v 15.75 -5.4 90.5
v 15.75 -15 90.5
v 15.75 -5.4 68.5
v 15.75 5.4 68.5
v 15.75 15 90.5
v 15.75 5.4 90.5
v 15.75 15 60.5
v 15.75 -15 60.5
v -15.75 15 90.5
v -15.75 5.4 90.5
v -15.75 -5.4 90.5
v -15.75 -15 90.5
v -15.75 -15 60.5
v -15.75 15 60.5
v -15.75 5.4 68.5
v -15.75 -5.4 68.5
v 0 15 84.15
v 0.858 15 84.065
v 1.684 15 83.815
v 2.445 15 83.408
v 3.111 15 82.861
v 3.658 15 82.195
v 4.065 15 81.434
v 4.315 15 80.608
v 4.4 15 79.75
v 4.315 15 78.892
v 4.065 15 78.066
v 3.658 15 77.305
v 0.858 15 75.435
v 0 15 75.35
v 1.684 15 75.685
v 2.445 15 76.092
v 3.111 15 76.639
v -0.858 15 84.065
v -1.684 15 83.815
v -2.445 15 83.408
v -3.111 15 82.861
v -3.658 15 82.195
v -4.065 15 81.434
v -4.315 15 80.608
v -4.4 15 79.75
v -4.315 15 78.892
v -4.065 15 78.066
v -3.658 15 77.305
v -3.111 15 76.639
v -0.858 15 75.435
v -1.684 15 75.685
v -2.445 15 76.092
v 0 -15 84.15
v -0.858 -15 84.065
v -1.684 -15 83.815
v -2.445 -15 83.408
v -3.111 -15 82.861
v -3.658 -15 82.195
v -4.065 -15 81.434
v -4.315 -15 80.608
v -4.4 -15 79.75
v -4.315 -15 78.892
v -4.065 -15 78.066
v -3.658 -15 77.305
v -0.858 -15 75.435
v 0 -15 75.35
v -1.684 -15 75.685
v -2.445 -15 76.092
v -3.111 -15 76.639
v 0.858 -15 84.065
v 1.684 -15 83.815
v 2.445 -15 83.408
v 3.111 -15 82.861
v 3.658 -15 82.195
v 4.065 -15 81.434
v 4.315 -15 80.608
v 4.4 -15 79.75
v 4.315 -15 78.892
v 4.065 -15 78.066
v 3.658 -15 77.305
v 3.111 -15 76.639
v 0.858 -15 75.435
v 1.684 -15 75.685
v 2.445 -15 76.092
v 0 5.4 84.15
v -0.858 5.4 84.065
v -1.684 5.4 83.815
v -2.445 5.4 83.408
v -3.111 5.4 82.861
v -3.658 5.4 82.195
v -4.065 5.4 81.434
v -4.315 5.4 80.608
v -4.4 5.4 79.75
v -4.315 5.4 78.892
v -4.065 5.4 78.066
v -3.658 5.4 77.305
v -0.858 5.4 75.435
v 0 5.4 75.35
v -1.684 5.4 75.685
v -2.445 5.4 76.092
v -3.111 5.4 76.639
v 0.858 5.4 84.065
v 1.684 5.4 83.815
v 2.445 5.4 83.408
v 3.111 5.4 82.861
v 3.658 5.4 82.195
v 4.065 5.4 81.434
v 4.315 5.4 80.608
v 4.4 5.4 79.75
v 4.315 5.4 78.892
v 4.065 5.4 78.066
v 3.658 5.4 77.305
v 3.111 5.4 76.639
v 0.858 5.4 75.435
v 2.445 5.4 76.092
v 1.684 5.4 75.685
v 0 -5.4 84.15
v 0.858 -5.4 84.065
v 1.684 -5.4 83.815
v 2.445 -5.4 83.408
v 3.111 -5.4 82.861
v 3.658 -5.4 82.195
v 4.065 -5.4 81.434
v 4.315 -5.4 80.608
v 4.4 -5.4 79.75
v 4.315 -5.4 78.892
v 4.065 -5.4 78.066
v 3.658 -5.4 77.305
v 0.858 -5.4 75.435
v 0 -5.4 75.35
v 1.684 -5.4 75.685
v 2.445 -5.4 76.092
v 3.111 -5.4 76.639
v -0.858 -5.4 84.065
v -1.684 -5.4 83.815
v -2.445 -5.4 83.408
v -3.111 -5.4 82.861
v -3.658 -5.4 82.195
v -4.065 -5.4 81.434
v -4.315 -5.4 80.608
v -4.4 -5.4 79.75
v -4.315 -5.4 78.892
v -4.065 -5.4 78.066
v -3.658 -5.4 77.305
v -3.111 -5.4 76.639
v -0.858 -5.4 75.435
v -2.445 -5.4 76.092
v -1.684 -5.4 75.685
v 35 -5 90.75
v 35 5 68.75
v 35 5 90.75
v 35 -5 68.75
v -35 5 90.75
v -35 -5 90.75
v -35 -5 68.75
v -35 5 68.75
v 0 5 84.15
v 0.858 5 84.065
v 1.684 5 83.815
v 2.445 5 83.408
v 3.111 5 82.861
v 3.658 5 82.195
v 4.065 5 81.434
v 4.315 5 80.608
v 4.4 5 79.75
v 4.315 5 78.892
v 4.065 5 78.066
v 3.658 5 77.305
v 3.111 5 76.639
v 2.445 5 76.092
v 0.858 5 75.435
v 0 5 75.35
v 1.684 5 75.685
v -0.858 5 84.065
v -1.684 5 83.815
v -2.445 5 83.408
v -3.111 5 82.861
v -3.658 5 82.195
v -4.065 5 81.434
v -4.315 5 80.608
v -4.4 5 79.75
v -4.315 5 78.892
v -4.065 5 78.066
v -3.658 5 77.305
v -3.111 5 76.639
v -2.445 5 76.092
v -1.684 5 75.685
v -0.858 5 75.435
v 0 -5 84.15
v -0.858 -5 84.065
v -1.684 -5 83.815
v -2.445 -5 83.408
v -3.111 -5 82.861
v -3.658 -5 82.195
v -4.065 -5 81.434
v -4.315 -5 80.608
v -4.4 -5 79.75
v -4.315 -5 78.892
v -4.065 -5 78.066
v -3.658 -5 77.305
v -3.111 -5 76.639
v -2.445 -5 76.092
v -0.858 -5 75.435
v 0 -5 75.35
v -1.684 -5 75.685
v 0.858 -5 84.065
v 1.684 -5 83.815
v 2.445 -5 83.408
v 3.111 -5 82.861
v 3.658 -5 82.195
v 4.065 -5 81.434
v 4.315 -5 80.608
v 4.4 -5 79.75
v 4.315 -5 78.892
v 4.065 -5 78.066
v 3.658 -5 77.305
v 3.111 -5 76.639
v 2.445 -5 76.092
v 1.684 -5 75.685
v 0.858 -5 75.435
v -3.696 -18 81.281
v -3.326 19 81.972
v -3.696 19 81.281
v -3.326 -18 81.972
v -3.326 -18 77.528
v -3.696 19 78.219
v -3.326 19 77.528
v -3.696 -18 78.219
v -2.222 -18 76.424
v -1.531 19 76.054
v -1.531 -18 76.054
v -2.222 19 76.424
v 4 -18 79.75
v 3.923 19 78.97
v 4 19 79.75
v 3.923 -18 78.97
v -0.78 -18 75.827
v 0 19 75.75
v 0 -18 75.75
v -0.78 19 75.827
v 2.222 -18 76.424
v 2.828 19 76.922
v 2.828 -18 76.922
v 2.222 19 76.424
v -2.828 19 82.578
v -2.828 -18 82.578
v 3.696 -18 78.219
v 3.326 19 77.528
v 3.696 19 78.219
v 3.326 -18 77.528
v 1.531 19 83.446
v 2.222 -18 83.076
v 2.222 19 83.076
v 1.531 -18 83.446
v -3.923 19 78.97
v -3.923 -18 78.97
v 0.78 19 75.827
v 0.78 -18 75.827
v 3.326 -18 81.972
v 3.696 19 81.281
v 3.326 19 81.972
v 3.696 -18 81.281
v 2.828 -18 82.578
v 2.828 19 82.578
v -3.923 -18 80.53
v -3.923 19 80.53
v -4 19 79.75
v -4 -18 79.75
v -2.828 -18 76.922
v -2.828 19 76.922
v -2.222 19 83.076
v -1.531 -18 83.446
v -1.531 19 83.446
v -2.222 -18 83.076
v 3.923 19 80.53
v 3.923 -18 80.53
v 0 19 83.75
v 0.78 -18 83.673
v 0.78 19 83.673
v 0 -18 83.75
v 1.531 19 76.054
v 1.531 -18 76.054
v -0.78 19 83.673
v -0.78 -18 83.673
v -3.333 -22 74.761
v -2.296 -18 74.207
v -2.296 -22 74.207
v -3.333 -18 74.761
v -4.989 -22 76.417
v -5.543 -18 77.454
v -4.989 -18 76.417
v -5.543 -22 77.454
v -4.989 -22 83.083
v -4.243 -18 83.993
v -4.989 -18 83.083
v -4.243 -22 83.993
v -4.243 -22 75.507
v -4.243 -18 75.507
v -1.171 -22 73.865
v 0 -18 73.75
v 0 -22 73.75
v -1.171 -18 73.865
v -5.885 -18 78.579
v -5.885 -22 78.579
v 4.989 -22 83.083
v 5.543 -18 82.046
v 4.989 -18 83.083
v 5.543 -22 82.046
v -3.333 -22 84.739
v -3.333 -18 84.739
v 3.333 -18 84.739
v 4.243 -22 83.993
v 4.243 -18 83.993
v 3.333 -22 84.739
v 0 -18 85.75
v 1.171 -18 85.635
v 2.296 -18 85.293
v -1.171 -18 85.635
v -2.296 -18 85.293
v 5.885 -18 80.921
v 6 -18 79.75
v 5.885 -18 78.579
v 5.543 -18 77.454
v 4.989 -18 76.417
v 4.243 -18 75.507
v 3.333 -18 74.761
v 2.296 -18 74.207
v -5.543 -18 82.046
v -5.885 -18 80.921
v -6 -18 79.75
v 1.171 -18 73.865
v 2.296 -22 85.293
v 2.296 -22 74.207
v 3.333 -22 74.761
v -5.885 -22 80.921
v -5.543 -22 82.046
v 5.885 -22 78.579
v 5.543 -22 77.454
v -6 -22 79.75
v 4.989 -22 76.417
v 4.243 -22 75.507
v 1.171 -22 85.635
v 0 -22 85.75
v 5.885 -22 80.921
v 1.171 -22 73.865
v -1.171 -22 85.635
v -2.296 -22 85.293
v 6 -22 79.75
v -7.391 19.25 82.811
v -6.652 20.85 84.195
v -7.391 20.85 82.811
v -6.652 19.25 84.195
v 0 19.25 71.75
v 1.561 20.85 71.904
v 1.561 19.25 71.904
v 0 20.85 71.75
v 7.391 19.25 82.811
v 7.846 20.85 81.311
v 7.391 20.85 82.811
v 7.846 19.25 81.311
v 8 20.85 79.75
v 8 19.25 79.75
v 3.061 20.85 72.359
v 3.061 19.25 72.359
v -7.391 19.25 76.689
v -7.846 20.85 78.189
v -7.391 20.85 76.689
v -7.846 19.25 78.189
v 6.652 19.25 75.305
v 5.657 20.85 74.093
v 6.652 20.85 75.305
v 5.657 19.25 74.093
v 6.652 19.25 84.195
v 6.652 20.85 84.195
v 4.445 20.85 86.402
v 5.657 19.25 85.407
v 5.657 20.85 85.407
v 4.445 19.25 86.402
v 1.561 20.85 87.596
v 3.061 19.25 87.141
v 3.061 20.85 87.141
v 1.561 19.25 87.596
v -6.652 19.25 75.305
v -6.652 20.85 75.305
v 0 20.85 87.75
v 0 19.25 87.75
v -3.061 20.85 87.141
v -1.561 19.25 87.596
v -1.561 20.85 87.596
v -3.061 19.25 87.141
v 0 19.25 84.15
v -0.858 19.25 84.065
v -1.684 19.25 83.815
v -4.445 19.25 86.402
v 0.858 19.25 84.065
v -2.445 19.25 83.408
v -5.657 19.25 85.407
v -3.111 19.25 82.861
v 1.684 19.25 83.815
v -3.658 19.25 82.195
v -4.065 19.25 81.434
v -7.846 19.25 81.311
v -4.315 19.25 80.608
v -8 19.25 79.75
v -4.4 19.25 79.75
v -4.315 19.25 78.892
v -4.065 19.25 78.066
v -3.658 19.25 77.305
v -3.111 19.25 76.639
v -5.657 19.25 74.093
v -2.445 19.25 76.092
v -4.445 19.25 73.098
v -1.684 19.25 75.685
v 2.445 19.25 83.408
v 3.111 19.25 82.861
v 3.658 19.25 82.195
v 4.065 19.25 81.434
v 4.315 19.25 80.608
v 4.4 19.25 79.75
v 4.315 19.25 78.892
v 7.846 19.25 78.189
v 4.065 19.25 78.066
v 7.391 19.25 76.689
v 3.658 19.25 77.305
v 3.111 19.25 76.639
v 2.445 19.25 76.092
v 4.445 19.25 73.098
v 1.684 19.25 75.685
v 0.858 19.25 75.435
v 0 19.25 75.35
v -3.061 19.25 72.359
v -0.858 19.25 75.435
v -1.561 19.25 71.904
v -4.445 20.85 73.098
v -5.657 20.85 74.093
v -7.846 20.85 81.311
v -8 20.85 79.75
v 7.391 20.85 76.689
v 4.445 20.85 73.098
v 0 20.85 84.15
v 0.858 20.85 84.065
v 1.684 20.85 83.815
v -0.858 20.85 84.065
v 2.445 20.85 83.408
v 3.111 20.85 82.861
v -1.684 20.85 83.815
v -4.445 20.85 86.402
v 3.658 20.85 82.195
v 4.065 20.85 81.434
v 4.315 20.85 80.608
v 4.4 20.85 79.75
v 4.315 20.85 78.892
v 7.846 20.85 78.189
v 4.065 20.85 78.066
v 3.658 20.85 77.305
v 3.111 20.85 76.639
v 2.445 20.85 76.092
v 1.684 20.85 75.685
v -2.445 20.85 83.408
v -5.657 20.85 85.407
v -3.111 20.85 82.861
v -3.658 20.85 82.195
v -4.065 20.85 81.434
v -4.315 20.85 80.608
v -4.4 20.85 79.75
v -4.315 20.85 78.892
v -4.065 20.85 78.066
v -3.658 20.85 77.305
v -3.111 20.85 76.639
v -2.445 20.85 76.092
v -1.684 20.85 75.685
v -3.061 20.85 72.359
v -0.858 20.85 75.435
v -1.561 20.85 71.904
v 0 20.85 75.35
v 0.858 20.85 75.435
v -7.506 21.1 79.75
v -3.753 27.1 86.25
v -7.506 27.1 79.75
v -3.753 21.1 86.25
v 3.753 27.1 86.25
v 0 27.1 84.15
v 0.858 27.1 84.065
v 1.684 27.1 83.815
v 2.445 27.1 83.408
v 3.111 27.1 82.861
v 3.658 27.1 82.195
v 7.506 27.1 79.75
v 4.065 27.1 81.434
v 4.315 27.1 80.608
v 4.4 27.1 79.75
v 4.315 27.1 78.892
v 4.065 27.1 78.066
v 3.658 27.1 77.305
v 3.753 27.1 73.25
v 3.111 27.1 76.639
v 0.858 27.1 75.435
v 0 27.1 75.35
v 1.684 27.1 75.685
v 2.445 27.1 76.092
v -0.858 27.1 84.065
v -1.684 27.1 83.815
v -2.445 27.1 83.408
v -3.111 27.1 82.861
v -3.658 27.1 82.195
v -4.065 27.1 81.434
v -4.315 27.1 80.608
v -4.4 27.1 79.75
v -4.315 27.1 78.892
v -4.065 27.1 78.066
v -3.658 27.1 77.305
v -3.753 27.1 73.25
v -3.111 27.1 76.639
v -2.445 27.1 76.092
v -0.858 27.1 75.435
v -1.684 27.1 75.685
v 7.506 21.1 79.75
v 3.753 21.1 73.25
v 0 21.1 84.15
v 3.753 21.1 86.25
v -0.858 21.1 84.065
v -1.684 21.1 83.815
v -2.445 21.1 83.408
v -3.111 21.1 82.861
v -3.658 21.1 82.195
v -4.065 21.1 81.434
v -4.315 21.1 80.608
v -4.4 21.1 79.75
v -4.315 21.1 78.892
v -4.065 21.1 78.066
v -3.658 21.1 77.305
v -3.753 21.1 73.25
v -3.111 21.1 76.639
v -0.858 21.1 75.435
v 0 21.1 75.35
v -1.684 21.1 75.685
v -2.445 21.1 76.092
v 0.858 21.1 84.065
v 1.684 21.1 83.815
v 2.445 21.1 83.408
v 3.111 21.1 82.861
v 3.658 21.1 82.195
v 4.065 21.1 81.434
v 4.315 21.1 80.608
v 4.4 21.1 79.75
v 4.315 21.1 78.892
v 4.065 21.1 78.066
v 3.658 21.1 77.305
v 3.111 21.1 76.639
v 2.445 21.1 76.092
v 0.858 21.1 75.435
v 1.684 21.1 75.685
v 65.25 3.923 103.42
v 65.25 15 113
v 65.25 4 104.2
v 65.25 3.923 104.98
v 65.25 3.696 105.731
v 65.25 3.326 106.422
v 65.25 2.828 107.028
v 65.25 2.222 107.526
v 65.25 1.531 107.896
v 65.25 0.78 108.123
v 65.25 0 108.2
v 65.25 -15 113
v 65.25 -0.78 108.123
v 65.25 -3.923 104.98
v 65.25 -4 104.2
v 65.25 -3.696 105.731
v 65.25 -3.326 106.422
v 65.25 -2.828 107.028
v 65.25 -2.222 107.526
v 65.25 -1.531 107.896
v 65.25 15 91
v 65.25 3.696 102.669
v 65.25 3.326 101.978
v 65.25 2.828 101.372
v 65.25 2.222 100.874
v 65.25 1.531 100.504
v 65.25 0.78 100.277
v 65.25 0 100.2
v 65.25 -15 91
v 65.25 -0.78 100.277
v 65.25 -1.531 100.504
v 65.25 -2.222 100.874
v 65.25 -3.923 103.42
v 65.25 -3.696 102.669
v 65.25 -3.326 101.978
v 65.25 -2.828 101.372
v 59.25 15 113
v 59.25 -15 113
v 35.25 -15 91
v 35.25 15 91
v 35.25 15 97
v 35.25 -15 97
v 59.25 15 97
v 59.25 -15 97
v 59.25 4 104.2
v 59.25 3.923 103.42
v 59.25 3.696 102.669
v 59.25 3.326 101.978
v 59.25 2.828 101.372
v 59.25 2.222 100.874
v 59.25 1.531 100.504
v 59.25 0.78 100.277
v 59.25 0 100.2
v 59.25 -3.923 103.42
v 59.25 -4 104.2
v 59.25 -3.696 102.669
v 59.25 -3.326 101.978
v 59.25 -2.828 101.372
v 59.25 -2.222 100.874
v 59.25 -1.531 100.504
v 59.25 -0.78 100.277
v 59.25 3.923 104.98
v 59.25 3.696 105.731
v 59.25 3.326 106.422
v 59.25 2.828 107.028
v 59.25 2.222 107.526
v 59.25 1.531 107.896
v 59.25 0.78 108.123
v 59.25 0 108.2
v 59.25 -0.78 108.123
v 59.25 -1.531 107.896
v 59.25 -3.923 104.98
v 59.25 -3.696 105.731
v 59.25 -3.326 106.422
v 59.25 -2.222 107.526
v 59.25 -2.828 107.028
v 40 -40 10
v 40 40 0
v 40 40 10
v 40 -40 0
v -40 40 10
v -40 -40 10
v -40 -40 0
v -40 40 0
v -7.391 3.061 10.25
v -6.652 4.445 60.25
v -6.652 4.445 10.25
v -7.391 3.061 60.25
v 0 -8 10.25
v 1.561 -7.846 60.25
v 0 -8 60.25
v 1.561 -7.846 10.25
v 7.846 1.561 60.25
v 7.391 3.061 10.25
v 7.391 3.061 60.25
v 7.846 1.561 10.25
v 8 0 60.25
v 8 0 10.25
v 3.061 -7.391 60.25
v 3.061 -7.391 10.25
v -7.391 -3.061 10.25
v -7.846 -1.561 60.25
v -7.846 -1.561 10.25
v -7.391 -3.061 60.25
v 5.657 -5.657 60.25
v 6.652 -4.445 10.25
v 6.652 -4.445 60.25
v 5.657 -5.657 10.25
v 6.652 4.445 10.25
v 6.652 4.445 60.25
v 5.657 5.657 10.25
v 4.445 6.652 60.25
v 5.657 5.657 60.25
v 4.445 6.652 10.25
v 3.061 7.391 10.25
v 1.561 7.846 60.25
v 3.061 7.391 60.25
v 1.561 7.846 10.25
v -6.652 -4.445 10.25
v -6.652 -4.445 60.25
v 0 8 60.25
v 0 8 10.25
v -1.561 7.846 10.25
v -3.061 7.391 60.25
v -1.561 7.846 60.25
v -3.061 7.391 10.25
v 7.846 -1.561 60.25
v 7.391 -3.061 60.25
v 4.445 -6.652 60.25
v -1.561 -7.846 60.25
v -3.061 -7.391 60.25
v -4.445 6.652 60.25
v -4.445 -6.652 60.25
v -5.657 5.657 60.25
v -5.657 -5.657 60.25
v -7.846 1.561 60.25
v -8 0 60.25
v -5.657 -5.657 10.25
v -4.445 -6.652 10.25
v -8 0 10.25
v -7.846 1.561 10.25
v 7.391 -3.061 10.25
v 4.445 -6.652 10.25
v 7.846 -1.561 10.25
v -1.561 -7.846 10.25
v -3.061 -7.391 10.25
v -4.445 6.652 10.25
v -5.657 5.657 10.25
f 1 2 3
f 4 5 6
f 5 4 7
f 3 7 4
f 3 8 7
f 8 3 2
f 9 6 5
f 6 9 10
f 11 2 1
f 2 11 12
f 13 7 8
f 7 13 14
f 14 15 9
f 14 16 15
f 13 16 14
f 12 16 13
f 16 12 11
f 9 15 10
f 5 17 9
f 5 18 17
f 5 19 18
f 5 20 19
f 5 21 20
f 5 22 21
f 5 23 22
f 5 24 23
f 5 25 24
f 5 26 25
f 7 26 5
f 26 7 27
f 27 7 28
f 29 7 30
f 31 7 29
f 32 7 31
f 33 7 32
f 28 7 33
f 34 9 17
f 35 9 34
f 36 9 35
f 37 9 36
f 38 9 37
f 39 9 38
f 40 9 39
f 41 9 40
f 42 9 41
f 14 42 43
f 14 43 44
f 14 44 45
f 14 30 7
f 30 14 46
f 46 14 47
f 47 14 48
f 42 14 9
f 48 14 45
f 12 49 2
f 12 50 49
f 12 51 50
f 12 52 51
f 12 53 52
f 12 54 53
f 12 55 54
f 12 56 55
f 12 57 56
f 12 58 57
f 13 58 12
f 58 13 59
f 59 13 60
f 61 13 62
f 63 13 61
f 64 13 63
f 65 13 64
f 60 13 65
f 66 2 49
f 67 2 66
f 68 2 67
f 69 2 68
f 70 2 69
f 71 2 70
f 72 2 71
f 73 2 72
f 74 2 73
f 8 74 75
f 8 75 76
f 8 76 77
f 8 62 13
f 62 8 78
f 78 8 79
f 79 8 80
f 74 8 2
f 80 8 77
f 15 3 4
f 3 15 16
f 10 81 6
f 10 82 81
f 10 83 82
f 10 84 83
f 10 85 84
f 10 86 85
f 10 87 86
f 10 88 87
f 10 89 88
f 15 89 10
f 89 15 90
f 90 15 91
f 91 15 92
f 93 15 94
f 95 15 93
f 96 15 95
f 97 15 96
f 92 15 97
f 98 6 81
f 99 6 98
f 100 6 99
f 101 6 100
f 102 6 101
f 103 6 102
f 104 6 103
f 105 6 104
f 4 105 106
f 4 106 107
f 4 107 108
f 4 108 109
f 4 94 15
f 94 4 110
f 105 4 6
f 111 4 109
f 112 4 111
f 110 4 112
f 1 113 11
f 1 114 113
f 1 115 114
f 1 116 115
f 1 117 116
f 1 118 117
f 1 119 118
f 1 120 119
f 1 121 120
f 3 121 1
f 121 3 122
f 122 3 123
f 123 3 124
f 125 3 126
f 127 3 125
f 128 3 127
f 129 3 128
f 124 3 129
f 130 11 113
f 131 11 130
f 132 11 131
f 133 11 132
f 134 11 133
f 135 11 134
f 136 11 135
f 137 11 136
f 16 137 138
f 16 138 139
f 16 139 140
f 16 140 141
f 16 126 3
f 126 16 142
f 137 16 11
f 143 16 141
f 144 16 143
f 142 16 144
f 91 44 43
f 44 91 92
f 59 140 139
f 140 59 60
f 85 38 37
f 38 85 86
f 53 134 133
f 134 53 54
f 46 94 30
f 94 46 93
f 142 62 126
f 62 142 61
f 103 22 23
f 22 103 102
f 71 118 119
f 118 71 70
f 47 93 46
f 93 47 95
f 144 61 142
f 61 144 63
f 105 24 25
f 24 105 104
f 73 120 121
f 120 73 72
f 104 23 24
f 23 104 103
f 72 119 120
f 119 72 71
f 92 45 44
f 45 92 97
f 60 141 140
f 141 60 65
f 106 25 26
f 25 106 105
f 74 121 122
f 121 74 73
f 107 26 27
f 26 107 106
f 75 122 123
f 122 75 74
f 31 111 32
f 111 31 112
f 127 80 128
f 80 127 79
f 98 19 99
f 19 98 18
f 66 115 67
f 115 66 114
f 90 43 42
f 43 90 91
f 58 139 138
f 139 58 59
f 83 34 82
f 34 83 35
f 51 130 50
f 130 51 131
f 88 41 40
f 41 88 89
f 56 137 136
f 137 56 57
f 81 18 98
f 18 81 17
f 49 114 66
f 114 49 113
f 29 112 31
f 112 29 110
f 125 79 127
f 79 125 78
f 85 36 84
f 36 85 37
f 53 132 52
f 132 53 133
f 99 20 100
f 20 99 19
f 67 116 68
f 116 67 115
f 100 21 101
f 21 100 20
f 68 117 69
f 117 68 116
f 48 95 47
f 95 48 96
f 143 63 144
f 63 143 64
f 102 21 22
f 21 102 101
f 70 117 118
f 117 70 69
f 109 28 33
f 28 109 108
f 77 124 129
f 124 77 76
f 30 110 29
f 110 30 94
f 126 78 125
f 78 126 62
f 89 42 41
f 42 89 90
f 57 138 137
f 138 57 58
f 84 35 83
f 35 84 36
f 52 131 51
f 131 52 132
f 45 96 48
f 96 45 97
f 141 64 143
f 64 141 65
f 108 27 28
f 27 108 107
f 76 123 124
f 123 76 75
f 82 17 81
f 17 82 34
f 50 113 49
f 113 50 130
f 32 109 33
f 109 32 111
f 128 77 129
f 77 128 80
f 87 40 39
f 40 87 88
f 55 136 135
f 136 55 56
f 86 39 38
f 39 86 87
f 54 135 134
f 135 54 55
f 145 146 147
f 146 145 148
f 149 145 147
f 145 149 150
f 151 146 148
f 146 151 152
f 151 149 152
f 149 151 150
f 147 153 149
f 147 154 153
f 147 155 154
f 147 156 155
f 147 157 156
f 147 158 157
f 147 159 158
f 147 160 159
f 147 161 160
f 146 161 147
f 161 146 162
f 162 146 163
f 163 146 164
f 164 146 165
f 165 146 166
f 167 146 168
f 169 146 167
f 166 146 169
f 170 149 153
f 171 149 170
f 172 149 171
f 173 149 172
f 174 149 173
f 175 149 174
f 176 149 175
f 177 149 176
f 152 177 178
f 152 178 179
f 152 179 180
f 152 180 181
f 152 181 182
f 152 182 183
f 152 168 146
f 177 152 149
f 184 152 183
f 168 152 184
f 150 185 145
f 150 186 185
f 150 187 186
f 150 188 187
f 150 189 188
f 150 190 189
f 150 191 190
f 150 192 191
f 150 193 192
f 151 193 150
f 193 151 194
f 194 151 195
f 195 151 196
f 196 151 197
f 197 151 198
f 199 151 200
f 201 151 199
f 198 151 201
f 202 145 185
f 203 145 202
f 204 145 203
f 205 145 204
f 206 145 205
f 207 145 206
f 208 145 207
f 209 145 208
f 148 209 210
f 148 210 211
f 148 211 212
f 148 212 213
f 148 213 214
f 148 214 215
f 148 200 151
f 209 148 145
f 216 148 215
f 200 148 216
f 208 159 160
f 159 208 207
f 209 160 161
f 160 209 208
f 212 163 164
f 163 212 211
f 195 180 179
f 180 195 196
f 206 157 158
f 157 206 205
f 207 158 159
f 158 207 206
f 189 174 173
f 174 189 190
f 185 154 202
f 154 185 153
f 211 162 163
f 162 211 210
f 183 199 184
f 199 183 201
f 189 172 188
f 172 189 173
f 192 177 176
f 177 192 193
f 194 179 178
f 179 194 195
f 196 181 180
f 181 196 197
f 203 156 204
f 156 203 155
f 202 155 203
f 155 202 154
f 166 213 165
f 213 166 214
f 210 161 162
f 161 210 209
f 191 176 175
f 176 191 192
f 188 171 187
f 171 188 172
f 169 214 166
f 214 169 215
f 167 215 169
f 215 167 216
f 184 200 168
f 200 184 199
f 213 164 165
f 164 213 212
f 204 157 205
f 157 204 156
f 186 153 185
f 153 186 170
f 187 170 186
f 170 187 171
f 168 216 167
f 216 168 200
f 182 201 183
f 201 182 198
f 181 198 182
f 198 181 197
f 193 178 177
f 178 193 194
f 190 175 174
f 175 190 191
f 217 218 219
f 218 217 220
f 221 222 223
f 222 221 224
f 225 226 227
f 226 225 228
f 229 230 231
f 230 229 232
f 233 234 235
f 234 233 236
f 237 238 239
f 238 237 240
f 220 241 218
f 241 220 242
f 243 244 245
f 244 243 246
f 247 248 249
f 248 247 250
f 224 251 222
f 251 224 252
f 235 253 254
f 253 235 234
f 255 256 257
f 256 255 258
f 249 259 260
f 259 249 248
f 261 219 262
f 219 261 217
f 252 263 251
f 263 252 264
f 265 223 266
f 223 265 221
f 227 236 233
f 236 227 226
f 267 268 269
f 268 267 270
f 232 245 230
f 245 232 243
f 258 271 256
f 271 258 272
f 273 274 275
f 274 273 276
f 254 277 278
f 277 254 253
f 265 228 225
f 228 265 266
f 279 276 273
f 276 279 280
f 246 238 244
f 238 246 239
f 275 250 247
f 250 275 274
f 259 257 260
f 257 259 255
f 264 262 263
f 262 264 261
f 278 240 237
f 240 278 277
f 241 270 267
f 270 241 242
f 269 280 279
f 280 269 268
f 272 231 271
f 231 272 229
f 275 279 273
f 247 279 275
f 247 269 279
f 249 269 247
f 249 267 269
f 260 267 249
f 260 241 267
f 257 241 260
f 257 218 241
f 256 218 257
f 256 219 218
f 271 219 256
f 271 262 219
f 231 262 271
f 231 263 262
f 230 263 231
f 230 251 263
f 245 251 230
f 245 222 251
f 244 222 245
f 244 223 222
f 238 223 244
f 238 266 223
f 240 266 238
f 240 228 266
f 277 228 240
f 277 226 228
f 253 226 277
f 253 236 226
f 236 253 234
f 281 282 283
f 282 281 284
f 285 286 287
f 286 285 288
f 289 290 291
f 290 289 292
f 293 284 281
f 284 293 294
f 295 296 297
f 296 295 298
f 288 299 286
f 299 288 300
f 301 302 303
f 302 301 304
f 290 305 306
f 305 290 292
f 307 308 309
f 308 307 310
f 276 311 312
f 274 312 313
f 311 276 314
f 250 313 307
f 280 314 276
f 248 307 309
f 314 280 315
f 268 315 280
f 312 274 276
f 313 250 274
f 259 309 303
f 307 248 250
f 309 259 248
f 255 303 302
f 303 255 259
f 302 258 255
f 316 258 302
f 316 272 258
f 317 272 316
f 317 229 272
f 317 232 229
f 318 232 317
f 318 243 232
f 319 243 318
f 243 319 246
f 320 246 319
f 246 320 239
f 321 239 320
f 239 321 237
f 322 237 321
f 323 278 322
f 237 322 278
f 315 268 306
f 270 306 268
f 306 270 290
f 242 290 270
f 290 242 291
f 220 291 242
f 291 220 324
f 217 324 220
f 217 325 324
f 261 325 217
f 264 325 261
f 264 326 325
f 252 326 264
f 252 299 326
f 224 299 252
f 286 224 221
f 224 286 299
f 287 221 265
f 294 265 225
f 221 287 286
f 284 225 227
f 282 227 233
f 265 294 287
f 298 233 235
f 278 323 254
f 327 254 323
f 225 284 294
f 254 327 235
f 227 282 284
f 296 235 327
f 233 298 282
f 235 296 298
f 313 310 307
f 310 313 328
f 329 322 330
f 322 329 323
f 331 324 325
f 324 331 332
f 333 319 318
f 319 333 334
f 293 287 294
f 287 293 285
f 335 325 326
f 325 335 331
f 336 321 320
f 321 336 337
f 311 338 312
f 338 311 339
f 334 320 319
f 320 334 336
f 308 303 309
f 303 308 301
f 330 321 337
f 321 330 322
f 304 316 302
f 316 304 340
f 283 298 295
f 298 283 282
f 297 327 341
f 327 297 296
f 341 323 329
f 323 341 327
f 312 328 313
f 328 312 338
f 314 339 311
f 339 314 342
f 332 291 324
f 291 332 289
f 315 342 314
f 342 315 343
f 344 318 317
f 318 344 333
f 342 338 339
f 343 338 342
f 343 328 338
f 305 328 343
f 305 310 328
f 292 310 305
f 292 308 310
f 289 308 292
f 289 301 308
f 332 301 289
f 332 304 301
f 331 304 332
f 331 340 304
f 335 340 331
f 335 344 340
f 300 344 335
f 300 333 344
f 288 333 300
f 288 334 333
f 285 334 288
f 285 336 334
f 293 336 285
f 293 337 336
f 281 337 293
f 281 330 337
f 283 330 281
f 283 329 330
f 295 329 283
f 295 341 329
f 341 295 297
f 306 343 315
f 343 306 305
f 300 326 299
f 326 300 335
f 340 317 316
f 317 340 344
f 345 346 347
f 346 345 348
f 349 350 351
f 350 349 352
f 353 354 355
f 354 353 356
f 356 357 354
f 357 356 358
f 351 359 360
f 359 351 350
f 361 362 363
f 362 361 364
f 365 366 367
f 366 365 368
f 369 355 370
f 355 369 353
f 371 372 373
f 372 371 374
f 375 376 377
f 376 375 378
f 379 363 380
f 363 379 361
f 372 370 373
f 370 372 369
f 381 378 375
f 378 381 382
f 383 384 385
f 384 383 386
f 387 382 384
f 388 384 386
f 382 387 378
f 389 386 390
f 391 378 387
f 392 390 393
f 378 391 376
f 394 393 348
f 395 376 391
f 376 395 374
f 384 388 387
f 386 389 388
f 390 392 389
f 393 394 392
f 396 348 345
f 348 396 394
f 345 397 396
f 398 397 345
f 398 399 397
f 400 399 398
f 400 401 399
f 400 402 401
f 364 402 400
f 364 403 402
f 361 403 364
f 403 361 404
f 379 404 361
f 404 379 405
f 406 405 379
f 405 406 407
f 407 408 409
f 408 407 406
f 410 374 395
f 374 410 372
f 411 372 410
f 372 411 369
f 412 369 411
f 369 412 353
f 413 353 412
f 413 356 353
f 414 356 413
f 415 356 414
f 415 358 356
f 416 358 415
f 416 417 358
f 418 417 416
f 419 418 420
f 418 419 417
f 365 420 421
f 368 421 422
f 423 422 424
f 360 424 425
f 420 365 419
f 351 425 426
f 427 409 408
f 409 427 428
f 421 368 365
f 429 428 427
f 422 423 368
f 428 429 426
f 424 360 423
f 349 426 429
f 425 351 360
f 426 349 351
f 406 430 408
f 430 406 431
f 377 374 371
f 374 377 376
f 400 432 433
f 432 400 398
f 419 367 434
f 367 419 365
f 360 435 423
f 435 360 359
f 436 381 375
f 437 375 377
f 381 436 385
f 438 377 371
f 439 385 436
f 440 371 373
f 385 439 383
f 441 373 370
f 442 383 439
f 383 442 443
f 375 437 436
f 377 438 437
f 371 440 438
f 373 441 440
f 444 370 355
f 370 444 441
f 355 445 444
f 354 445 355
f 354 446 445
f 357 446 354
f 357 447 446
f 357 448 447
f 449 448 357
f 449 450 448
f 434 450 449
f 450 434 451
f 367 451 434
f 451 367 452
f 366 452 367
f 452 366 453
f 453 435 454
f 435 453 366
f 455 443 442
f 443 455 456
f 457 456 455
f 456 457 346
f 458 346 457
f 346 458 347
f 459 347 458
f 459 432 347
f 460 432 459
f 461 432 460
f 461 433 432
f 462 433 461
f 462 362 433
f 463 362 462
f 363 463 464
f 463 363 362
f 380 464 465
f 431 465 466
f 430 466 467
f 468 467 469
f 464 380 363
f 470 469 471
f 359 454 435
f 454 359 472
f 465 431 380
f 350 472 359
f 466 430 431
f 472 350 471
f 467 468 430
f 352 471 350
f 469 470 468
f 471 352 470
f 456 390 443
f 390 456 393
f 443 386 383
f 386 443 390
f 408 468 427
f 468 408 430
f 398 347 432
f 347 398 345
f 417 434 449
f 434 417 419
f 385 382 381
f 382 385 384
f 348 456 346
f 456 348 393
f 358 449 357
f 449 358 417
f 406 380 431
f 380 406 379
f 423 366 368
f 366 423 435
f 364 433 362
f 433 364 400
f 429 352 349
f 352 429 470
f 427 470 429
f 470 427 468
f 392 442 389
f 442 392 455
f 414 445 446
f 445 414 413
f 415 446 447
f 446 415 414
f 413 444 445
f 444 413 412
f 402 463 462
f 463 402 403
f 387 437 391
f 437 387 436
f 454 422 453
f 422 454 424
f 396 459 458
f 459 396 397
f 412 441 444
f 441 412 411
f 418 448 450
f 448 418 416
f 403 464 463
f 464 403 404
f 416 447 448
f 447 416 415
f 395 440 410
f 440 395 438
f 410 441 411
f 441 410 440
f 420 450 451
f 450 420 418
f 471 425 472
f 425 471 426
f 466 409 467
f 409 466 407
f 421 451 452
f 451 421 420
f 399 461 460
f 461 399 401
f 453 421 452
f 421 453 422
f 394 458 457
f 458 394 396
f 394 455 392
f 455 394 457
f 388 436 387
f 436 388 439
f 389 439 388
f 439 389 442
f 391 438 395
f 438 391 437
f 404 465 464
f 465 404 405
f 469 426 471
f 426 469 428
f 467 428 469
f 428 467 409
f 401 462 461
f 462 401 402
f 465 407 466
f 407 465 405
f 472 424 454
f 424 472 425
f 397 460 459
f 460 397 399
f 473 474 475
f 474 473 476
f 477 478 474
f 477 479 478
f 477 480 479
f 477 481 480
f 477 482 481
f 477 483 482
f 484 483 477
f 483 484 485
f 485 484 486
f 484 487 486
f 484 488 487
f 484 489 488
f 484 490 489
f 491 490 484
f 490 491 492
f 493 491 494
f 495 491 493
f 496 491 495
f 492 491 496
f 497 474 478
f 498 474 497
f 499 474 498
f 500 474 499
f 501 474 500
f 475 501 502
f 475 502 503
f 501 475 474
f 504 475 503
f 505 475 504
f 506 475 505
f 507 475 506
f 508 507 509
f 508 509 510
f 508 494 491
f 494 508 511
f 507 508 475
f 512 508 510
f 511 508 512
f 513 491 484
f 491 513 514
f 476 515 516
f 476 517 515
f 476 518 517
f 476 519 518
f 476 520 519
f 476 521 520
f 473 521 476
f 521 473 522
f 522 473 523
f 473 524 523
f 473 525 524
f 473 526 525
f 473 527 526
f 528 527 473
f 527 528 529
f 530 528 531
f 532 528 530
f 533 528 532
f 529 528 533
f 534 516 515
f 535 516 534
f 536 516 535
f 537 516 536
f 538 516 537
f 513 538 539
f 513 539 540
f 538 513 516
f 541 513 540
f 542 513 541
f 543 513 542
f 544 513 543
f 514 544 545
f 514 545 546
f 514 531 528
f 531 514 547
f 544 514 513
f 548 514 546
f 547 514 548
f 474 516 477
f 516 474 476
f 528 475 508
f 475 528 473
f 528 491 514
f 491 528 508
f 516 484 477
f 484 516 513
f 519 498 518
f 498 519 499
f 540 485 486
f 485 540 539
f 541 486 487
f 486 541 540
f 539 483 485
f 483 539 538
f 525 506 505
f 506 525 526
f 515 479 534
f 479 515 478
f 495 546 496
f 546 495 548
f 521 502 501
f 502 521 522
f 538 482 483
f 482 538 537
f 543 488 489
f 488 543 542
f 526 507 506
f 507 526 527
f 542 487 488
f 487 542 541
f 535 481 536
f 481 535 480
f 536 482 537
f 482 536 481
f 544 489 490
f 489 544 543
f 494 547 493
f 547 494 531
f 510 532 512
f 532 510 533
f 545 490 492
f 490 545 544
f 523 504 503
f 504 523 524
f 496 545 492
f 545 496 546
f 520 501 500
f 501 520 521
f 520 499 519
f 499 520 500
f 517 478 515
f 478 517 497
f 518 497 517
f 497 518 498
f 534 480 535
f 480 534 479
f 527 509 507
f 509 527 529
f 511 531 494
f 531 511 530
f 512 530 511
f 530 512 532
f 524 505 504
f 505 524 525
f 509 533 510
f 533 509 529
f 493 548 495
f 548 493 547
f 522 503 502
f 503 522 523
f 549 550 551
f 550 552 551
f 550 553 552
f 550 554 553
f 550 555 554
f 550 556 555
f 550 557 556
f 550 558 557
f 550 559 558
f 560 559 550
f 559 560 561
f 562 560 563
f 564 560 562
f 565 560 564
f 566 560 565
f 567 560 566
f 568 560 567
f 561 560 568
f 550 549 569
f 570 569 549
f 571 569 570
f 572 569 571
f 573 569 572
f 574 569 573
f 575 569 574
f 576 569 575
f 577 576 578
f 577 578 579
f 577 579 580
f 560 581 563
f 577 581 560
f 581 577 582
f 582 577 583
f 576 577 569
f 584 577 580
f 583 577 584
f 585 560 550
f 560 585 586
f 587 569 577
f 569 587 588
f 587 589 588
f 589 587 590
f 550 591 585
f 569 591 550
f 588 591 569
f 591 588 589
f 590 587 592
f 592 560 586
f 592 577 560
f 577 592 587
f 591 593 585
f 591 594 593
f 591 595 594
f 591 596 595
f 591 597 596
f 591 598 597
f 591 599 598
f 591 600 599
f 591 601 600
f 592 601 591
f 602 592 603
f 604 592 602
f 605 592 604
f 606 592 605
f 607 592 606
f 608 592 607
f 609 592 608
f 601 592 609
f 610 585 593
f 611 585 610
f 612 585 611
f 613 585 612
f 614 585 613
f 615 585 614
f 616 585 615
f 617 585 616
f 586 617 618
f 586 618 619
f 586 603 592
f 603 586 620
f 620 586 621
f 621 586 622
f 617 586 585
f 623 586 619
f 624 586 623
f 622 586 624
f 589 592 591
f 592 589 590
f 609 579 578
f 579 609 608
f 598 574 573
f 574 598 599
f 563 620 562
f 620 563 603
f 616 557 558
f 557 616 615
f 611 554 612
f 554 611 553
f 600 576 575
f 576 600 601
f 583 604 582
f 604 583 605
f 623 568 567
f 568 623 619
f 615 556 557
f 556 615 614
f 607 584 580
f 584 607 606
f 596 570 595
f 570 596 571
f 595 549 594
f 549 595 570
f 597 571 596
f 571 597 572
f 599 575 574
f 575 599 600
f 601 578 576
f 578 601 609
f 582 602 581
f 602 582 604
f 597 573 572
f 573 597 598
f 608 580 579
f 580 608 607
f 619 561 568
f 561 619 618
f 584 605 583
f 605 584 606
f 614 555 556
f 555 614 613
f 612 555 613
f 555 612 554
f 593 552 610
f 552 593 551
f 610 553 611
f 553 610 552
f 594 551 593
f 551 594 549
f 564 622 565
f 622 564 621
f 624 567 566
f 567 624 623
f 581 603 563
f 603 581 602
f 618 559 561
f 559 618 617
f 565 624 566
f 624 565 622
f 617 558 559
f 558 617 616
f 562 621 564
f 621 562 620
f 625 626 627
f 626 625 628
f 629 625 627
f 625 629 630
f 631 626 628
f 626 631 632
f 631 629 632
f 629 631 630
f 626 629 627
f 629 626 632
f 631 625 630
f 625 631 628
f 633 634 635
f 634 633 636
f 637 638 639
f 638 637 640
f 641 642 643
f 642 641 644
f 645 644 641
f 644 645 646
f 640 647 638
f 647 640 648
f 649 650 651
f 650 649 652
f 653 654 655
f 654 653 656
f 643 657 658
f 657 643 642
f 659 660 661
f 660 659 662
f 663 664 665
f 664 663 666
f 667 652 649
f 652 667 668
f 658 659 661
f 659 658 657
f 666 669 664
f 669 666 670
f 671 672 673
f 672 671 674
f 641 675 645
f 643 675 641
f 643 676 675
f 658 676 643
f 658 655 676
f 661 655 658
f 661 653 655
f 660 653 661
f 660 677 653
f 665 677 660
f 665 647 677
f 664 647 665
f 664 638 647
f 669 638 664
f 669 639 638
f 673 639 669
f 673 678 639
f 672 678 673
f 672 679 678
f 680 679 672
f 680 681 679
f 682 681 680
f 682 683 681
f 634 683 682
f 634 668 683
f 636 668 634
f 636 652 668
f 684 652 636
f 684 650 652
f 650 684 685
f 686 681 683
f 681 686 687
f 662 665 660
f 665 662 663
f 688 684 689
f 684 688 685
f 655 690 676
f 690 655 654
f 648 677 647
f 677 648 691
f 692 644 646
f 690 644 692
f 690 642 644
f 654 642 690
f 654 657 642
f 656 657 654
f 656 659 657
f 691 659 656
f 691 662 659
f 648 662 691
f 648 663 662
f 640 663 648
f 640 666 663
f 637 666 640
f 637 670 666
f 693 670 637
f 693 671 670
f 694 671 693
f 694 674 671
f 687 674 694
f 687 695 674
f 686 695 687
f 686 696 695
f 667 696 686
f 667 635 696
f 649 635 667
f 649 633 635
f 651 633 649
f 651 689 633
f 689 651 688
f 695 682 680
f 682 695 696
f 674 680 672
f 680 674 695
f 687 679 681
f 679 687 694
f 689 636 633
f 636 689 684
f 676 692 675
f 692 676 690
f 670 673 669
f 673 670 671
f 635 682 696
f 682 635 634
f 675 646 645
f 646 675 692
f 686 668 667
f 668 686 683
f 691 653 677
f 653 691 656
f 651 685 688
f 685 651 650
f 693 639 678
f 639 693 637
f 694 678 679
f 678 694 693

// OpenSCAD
$fn = 32;

// ------------------------------------------------------------------------
// Lamp arm: column d16 x 50 mm, arm 70 mm
// Every part is its own module, assembly() places every instance.
// ------------------------------------------------------------------------

// --- part 1 ---
module lamp_base() {
  difference() {
    translate([-40, -40, 0]) cube([80, 80, 10]);
  }
}

// --- part 2 ---
module lamp_column() {
  cylinder(h = 50, d = 16);
}

// --- part 3 ---
module head_fork() {
  difference() {
    translate([-15.75, -15, 0]) cube([31.5, 30, 30]);
    translate([-16.75, -5.4, 8]) cube([33.5, 10.8, 23]);
    translate([0, 0, 19.25]) rotate([90, 0, 0]) cylinder(h = 32, d = 8.8, center = true);
  }
}

// --- part 4 ---
module lamp_arm() {
  difference() {
    translate([-35, -5, 0]) cube([70, 10, 22]);
    translate([0, 0, 11]) rotate([90, 0, 0]) cylinder(h = 12, d = 8.8, center = true);
  }
}

// --- part 5 ---
module arm_pin() {
  rotate([0, 90, 0]) cylinder(h = 38, d = 8, center = true);
  translate([-22, 0, 0]) rotate([0, 90, 0]) cylinder(h = 4, d = 12);
}

// --- part 6 ---
module arm_washer() {
  difference() {
      translate([0, 0, 0]) cylinder(h = 1.6, d = 16);
      translate([0, 0, -1]) cylinder(h = 3.6, d = 8.8);
    }
}

// --- part 7 ---
module arm_nut() {
  difference() {
    linear_extrude(height = 6) polygon(points = [[7.506, 0], [3.753, 6.5], [-3.753, 6.5], [-7.506, 0], [-3.753, -6.5], [3.753, -6.5]]);
    translate([0, 0, -1]) cylinder(h = 8, d = 8.8);
  }
}

// --- part 8 ---
module shade_bracket() {
  difference() {
    translate([-15, -15, 0]) cube([30, 30, 22]);
    translate([-16, -16, 6]) cube([25, 32, 17]);
    translate([12, 0, 13.2]) rotate([0, 90, 0]) cylinder(h = 8, d = 8, center = true);
  }
}

// --- assembly ---
module assembly() {
  color([0.80, 0.24, 0.20]) translate([0, 0, 0]) rotate([0, 0, 0]) lamp_base();
  color([0.20, 0.45, 0.75]) translate([0, 0, 10.25]) rotate([0, 0, 0]) lamp_column();
  color([0.25, 0.62, 0.32]) translate([0, 0, 60.5]) rotate([0, 0, 0]) head_fork();
  color([0.92, 0.70, 0.18]) translate([0, 0, 68.75]) rotate([0, 0, 0]) lamp_arm();
  color([0.58, 0.35, 0.70]) translate([0, 0, 79.75]) rotate([0, 0, 90]) arm_pin();
  color([0.16, 0.66, 0.66]) translate([0, 20.85, 79.75]) rotate([90, 0, 0]) arm_washer();
  color([0.85, 0.48, 0.18]) translate([0, 27.1, 79.75]) rotate([90, 0, 0]) arm_nut();
  color([0.55, 0.60, 0.65]) translate([50.25, 0, 91]) rotate([0, 0, 0]) shade_bracket();
}

assembly();
